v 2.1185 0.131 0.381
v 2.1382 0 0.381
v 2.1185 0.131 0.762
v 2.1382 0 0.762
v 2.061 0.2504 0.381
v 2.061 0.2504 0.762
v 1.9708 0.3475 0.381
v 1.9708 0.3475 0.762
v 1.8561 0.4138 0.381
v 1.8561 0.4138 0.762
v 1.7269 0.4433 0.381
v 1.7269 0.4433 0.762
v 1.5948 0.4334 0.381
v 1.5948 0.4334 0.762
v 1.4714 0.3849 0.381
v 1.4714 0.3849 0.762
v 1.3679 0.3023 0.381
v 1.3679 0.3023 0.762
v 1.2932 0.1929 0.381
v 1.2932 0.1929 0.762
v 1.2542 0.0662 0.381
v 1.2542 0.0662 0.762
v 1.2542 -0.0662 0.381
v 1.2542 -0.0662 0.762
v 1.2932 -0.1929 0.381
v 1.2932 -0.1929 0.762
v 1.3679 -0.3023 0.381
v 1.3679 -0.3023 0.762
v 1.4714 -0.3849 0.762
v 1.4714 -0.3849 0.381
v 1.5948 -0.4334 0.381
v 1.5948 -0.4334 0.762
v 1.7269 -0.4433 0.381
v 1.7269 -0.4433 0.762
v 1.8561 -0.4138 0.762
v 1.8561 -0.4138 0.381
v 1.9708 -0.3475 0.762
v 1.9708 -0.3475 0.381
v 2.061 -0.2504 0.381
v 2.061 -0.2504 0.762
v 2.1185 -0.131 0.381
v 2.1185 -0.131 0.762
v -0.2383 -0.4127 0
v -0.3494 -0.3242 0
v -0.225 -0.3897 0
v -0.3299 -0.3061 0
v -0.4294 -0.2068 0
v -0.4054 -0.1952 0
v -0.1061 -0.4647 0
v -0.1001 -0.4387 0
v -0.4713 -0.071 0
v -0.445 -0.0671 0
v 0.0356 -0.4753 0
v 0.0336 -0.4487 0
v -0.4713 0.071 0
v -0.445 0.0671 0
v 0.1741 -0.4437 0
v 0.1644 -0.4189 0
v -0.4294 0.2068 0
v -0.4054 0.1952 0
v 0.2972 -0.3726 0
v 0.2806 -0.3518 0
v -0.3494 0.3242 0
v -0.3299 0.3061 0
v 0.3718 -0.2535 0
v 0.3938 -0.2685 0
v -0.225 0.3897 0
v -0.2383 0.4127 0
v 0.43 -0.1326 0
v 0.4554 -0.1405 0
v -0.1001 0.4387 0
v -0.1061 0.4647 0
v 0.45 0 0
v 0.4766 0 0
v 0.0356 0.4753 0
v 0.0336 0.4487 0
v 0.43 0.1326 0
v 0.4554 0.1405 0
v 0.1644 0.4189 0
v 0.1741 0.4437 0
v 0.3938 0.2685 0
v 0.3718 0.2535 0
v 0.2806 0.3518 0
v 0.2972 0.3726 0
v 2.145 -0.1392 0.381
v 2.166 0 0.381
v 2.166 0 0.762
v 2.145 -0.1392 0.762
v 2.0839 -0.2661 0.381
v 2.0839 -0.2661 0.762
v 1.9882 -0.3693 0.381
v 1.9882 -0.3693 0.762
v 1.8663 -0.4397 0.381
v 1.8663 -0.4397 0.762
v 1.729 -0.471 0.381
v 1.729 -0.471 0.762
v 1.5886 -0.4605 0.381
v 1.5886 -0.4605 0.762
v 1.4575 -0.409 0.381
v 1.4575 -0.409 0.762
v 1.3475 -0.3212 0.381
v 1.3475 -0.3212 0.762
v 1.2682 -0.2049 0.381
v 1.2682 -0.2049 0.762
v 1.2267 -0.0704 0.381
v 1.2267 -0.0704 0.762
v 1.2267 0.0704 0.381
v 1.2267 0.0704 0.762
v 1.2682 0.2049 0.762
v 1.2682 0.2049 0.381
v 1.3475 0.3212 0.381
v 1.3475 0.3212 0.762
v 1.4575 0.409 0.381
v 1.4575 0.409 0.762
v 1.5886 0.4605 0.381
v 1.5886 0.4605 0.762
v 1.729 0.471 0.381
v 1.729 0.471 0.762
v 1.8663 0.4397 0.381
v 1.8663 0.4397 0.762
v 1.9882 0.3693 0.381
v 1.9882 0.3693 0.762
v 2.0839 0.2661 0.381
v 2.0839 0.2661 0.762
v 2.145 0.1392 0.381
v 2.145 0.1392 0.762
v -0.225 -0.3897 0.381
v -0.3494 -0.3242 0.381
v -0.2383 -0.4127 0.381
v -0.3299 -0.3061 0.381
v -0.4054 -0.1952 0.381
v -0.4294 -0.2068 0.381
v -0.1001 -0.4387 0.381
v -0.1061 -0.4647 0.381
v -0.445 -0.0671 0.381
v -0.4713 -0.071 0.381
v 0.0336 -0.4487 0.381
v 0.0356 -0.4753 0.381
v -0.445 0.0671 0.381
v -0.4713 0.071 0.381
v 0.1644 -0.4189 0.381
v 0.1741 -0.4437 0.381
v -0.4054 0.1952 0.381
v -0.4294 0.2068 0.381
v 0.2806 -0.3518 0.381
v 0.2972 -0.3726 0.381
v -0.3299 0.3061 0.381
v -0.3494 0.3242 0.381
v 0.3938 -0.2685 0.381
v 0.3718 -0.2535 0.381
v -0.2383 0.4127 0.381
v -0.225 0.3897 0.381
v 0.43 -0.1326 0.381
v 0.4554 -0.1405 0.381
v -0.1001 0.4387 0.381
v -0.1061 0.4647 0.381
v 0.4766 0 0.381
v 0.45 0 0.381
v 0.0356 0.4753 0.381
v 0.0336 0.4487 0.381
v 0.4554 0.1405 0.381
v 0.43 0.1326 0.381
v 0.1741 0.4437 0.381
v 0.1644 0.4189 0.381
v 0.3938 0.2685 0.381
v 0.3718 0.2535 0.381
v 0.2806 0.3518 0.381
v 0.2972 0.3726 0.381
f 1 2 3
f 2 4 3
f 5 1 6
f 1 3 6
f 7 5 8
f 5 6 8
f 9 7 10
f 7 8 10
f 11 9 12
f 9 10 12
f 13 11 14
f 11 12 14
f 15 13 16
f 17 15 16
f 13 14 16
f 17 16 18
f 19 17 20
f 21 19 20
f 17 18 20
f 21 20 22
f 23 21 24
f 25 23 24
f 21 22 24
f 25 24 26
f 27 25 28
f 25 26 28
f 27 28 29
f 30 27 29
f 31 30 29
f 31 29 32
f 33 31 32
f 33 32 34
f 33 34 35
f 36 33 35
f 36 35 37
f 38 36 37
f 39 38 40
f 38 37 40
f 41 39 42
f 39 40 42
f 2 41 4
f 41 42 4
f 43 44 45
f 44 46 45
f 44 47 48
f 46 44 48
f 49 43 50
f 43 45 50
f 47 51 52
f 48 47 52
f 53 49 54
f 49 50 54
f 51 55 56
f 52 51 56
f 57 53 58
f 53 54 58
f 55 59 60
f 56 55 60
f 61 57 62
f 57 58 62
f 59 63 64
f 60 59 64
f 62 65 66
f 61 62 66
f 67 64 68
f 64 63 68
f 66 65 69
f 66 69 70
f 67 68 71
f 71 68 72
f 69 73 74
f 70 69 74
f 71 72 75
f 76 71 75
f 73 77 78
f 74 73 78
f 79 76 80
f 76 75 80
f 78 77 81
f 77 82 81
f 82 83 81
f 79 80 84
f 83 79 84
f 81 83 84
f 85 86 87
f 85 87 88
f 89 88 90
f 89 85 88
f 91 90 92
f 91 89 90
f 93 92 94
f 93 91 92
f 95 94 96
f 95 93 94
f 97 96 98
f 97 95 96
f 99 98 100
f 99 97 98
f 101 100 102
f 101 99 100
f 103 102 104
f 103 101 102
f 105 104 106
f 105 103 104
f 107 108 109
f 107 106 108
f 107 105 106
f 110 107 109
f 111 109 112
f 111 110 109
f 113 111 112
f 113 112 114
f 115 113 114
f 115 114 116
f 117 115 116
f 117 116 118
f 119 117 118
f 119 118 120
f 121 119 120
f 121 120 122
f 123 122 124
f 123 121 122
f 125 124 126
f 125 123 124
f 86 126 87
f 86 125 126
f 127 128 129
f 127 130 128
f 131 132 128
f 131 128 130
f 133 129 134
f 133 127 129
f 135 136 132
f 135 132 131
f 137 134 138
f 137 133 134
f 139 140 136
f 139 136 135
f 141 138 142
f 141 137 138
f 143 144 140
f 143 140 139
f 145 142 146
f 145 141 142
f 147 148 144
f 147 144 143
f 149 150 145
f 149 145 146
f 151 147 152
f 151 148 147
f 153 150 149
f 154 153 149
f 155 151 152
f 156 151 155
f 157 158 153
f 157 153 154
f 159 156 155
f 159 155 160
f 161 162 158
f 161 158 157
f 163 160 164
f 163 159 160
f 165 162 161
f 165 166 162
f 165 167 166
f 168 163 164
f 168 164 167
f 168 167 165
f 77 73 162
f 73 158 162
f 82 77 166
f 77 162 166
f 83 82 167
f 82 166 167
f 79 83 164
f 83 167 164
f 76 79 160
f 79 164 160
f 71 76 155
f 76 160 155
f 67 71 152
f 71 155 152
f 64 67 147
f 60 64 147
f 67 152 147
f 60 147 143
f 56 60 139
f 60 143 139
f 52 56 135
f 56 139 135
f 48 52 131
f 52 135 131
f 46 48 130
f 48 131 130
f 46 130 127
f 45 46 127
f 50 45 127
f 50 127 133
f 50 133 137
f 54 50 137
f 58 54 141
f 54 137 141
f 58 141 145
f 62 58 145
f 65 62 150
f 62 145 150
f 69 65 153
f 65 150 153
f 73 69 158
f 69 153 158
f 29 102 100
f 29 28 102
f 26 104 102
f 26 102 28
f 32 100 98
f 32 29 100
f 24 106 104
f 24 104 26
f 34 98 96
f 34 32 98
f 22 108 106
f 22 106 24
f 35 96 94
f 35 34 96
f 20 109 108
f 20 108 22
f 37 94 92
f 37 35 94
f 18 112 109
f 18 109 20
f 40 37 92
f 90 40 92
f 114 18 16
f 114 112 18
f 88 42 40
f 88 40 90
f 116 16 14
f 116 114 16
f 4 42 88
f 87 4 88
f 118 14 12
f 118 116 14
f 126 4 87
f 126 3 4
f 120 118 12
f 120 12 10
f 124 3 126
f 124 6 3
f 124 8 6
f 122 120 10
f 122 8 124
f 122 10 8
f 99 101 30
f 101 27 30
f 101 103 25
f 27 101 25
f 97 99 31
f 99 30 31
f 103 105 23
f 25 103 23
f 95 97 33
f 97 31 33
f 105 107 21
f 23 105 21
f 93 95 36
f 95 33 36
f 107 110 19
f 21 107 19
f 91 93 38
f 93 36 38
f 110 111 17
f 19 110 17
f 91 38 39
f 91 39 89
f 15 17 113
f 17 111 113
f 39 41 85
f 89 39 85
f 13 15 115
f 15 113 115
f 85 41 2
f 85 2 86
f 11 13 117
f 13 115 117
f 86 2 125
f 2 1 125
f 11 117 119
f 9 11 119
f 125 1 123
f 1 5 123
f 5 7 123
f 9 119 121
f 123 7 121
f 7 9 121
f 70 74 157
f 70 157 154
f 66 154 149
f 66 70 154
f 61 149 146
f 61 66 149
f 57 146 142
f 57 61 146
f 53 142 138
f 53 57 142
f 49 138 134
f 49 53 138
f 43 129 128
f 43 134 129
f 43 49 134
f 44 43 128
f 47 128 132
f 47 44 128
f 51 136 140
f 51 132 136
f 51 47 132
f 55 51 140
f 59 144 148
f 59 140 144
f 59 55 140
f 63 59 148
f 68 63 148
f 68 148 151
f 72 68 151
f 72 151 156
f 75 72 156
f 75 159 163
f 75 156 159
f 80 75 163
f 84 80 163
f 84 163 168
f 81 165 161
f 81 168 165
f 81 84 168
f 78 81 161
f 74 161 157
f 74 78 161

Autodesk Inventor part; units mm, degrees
ref_plane "YZ Plane" through (0, 0, 0) normal (1, 0, 0) x (0, 1, 0)
ref_plane "XZ Plane" through (0, 0, 0) normal (0, 1, 0) x (-1, 0, 0)
ref_plane "XY Plane" through (0, 0, 0) normal (0, 0, 1) x (1, 0, 0)
sketch "Sketch1" plane through (0, 0, 0) normal (0, 0, 1) x (1, 0, 0)
  circle A0 centre (0, 0) radius 0.4766
extrude "Extrusion1" add sketch "Sketch1" along normal blind 0.381
sketch "Sketch2" plane through (0, 0, 0.381) normal (0, 0, 1) x (1, 0, 0)
  circle A0 centre (0, 0) radius 0.45
extrude "Extrusion2" cut sketch "Sketch2" against normal blind 0.381
sketch "Sketch3" plane through (0, 0, 0.381) normal (0, 0, 1) x (1, 0, 0)
  point P0 (0, 0)
sketch "Sketch4" plane through (0, 0, 0.381) normal (0, 0, 1) x (1, 0, 0)
  circle A0 centre (1.6937, 0) radius 0.4723
  point P0 (0, 0)
extrude "Extrusion3" add sketch "Sketch4" along normal blind 0.381
sketch "Sketch5" plane through (1.6937, 0, 0.762) normal (0, 0, 1) x (1, 0, 0)
  circle A0 centre (0, 0) radius 0.4445
  point P0 (-1.6937, 0)
  dimension "d6" = 0.889
extrude "Extrusion4" cut sketch "Sketch5" against normal blind 0.381
properties part number "rings" material "Steel, Cast"
